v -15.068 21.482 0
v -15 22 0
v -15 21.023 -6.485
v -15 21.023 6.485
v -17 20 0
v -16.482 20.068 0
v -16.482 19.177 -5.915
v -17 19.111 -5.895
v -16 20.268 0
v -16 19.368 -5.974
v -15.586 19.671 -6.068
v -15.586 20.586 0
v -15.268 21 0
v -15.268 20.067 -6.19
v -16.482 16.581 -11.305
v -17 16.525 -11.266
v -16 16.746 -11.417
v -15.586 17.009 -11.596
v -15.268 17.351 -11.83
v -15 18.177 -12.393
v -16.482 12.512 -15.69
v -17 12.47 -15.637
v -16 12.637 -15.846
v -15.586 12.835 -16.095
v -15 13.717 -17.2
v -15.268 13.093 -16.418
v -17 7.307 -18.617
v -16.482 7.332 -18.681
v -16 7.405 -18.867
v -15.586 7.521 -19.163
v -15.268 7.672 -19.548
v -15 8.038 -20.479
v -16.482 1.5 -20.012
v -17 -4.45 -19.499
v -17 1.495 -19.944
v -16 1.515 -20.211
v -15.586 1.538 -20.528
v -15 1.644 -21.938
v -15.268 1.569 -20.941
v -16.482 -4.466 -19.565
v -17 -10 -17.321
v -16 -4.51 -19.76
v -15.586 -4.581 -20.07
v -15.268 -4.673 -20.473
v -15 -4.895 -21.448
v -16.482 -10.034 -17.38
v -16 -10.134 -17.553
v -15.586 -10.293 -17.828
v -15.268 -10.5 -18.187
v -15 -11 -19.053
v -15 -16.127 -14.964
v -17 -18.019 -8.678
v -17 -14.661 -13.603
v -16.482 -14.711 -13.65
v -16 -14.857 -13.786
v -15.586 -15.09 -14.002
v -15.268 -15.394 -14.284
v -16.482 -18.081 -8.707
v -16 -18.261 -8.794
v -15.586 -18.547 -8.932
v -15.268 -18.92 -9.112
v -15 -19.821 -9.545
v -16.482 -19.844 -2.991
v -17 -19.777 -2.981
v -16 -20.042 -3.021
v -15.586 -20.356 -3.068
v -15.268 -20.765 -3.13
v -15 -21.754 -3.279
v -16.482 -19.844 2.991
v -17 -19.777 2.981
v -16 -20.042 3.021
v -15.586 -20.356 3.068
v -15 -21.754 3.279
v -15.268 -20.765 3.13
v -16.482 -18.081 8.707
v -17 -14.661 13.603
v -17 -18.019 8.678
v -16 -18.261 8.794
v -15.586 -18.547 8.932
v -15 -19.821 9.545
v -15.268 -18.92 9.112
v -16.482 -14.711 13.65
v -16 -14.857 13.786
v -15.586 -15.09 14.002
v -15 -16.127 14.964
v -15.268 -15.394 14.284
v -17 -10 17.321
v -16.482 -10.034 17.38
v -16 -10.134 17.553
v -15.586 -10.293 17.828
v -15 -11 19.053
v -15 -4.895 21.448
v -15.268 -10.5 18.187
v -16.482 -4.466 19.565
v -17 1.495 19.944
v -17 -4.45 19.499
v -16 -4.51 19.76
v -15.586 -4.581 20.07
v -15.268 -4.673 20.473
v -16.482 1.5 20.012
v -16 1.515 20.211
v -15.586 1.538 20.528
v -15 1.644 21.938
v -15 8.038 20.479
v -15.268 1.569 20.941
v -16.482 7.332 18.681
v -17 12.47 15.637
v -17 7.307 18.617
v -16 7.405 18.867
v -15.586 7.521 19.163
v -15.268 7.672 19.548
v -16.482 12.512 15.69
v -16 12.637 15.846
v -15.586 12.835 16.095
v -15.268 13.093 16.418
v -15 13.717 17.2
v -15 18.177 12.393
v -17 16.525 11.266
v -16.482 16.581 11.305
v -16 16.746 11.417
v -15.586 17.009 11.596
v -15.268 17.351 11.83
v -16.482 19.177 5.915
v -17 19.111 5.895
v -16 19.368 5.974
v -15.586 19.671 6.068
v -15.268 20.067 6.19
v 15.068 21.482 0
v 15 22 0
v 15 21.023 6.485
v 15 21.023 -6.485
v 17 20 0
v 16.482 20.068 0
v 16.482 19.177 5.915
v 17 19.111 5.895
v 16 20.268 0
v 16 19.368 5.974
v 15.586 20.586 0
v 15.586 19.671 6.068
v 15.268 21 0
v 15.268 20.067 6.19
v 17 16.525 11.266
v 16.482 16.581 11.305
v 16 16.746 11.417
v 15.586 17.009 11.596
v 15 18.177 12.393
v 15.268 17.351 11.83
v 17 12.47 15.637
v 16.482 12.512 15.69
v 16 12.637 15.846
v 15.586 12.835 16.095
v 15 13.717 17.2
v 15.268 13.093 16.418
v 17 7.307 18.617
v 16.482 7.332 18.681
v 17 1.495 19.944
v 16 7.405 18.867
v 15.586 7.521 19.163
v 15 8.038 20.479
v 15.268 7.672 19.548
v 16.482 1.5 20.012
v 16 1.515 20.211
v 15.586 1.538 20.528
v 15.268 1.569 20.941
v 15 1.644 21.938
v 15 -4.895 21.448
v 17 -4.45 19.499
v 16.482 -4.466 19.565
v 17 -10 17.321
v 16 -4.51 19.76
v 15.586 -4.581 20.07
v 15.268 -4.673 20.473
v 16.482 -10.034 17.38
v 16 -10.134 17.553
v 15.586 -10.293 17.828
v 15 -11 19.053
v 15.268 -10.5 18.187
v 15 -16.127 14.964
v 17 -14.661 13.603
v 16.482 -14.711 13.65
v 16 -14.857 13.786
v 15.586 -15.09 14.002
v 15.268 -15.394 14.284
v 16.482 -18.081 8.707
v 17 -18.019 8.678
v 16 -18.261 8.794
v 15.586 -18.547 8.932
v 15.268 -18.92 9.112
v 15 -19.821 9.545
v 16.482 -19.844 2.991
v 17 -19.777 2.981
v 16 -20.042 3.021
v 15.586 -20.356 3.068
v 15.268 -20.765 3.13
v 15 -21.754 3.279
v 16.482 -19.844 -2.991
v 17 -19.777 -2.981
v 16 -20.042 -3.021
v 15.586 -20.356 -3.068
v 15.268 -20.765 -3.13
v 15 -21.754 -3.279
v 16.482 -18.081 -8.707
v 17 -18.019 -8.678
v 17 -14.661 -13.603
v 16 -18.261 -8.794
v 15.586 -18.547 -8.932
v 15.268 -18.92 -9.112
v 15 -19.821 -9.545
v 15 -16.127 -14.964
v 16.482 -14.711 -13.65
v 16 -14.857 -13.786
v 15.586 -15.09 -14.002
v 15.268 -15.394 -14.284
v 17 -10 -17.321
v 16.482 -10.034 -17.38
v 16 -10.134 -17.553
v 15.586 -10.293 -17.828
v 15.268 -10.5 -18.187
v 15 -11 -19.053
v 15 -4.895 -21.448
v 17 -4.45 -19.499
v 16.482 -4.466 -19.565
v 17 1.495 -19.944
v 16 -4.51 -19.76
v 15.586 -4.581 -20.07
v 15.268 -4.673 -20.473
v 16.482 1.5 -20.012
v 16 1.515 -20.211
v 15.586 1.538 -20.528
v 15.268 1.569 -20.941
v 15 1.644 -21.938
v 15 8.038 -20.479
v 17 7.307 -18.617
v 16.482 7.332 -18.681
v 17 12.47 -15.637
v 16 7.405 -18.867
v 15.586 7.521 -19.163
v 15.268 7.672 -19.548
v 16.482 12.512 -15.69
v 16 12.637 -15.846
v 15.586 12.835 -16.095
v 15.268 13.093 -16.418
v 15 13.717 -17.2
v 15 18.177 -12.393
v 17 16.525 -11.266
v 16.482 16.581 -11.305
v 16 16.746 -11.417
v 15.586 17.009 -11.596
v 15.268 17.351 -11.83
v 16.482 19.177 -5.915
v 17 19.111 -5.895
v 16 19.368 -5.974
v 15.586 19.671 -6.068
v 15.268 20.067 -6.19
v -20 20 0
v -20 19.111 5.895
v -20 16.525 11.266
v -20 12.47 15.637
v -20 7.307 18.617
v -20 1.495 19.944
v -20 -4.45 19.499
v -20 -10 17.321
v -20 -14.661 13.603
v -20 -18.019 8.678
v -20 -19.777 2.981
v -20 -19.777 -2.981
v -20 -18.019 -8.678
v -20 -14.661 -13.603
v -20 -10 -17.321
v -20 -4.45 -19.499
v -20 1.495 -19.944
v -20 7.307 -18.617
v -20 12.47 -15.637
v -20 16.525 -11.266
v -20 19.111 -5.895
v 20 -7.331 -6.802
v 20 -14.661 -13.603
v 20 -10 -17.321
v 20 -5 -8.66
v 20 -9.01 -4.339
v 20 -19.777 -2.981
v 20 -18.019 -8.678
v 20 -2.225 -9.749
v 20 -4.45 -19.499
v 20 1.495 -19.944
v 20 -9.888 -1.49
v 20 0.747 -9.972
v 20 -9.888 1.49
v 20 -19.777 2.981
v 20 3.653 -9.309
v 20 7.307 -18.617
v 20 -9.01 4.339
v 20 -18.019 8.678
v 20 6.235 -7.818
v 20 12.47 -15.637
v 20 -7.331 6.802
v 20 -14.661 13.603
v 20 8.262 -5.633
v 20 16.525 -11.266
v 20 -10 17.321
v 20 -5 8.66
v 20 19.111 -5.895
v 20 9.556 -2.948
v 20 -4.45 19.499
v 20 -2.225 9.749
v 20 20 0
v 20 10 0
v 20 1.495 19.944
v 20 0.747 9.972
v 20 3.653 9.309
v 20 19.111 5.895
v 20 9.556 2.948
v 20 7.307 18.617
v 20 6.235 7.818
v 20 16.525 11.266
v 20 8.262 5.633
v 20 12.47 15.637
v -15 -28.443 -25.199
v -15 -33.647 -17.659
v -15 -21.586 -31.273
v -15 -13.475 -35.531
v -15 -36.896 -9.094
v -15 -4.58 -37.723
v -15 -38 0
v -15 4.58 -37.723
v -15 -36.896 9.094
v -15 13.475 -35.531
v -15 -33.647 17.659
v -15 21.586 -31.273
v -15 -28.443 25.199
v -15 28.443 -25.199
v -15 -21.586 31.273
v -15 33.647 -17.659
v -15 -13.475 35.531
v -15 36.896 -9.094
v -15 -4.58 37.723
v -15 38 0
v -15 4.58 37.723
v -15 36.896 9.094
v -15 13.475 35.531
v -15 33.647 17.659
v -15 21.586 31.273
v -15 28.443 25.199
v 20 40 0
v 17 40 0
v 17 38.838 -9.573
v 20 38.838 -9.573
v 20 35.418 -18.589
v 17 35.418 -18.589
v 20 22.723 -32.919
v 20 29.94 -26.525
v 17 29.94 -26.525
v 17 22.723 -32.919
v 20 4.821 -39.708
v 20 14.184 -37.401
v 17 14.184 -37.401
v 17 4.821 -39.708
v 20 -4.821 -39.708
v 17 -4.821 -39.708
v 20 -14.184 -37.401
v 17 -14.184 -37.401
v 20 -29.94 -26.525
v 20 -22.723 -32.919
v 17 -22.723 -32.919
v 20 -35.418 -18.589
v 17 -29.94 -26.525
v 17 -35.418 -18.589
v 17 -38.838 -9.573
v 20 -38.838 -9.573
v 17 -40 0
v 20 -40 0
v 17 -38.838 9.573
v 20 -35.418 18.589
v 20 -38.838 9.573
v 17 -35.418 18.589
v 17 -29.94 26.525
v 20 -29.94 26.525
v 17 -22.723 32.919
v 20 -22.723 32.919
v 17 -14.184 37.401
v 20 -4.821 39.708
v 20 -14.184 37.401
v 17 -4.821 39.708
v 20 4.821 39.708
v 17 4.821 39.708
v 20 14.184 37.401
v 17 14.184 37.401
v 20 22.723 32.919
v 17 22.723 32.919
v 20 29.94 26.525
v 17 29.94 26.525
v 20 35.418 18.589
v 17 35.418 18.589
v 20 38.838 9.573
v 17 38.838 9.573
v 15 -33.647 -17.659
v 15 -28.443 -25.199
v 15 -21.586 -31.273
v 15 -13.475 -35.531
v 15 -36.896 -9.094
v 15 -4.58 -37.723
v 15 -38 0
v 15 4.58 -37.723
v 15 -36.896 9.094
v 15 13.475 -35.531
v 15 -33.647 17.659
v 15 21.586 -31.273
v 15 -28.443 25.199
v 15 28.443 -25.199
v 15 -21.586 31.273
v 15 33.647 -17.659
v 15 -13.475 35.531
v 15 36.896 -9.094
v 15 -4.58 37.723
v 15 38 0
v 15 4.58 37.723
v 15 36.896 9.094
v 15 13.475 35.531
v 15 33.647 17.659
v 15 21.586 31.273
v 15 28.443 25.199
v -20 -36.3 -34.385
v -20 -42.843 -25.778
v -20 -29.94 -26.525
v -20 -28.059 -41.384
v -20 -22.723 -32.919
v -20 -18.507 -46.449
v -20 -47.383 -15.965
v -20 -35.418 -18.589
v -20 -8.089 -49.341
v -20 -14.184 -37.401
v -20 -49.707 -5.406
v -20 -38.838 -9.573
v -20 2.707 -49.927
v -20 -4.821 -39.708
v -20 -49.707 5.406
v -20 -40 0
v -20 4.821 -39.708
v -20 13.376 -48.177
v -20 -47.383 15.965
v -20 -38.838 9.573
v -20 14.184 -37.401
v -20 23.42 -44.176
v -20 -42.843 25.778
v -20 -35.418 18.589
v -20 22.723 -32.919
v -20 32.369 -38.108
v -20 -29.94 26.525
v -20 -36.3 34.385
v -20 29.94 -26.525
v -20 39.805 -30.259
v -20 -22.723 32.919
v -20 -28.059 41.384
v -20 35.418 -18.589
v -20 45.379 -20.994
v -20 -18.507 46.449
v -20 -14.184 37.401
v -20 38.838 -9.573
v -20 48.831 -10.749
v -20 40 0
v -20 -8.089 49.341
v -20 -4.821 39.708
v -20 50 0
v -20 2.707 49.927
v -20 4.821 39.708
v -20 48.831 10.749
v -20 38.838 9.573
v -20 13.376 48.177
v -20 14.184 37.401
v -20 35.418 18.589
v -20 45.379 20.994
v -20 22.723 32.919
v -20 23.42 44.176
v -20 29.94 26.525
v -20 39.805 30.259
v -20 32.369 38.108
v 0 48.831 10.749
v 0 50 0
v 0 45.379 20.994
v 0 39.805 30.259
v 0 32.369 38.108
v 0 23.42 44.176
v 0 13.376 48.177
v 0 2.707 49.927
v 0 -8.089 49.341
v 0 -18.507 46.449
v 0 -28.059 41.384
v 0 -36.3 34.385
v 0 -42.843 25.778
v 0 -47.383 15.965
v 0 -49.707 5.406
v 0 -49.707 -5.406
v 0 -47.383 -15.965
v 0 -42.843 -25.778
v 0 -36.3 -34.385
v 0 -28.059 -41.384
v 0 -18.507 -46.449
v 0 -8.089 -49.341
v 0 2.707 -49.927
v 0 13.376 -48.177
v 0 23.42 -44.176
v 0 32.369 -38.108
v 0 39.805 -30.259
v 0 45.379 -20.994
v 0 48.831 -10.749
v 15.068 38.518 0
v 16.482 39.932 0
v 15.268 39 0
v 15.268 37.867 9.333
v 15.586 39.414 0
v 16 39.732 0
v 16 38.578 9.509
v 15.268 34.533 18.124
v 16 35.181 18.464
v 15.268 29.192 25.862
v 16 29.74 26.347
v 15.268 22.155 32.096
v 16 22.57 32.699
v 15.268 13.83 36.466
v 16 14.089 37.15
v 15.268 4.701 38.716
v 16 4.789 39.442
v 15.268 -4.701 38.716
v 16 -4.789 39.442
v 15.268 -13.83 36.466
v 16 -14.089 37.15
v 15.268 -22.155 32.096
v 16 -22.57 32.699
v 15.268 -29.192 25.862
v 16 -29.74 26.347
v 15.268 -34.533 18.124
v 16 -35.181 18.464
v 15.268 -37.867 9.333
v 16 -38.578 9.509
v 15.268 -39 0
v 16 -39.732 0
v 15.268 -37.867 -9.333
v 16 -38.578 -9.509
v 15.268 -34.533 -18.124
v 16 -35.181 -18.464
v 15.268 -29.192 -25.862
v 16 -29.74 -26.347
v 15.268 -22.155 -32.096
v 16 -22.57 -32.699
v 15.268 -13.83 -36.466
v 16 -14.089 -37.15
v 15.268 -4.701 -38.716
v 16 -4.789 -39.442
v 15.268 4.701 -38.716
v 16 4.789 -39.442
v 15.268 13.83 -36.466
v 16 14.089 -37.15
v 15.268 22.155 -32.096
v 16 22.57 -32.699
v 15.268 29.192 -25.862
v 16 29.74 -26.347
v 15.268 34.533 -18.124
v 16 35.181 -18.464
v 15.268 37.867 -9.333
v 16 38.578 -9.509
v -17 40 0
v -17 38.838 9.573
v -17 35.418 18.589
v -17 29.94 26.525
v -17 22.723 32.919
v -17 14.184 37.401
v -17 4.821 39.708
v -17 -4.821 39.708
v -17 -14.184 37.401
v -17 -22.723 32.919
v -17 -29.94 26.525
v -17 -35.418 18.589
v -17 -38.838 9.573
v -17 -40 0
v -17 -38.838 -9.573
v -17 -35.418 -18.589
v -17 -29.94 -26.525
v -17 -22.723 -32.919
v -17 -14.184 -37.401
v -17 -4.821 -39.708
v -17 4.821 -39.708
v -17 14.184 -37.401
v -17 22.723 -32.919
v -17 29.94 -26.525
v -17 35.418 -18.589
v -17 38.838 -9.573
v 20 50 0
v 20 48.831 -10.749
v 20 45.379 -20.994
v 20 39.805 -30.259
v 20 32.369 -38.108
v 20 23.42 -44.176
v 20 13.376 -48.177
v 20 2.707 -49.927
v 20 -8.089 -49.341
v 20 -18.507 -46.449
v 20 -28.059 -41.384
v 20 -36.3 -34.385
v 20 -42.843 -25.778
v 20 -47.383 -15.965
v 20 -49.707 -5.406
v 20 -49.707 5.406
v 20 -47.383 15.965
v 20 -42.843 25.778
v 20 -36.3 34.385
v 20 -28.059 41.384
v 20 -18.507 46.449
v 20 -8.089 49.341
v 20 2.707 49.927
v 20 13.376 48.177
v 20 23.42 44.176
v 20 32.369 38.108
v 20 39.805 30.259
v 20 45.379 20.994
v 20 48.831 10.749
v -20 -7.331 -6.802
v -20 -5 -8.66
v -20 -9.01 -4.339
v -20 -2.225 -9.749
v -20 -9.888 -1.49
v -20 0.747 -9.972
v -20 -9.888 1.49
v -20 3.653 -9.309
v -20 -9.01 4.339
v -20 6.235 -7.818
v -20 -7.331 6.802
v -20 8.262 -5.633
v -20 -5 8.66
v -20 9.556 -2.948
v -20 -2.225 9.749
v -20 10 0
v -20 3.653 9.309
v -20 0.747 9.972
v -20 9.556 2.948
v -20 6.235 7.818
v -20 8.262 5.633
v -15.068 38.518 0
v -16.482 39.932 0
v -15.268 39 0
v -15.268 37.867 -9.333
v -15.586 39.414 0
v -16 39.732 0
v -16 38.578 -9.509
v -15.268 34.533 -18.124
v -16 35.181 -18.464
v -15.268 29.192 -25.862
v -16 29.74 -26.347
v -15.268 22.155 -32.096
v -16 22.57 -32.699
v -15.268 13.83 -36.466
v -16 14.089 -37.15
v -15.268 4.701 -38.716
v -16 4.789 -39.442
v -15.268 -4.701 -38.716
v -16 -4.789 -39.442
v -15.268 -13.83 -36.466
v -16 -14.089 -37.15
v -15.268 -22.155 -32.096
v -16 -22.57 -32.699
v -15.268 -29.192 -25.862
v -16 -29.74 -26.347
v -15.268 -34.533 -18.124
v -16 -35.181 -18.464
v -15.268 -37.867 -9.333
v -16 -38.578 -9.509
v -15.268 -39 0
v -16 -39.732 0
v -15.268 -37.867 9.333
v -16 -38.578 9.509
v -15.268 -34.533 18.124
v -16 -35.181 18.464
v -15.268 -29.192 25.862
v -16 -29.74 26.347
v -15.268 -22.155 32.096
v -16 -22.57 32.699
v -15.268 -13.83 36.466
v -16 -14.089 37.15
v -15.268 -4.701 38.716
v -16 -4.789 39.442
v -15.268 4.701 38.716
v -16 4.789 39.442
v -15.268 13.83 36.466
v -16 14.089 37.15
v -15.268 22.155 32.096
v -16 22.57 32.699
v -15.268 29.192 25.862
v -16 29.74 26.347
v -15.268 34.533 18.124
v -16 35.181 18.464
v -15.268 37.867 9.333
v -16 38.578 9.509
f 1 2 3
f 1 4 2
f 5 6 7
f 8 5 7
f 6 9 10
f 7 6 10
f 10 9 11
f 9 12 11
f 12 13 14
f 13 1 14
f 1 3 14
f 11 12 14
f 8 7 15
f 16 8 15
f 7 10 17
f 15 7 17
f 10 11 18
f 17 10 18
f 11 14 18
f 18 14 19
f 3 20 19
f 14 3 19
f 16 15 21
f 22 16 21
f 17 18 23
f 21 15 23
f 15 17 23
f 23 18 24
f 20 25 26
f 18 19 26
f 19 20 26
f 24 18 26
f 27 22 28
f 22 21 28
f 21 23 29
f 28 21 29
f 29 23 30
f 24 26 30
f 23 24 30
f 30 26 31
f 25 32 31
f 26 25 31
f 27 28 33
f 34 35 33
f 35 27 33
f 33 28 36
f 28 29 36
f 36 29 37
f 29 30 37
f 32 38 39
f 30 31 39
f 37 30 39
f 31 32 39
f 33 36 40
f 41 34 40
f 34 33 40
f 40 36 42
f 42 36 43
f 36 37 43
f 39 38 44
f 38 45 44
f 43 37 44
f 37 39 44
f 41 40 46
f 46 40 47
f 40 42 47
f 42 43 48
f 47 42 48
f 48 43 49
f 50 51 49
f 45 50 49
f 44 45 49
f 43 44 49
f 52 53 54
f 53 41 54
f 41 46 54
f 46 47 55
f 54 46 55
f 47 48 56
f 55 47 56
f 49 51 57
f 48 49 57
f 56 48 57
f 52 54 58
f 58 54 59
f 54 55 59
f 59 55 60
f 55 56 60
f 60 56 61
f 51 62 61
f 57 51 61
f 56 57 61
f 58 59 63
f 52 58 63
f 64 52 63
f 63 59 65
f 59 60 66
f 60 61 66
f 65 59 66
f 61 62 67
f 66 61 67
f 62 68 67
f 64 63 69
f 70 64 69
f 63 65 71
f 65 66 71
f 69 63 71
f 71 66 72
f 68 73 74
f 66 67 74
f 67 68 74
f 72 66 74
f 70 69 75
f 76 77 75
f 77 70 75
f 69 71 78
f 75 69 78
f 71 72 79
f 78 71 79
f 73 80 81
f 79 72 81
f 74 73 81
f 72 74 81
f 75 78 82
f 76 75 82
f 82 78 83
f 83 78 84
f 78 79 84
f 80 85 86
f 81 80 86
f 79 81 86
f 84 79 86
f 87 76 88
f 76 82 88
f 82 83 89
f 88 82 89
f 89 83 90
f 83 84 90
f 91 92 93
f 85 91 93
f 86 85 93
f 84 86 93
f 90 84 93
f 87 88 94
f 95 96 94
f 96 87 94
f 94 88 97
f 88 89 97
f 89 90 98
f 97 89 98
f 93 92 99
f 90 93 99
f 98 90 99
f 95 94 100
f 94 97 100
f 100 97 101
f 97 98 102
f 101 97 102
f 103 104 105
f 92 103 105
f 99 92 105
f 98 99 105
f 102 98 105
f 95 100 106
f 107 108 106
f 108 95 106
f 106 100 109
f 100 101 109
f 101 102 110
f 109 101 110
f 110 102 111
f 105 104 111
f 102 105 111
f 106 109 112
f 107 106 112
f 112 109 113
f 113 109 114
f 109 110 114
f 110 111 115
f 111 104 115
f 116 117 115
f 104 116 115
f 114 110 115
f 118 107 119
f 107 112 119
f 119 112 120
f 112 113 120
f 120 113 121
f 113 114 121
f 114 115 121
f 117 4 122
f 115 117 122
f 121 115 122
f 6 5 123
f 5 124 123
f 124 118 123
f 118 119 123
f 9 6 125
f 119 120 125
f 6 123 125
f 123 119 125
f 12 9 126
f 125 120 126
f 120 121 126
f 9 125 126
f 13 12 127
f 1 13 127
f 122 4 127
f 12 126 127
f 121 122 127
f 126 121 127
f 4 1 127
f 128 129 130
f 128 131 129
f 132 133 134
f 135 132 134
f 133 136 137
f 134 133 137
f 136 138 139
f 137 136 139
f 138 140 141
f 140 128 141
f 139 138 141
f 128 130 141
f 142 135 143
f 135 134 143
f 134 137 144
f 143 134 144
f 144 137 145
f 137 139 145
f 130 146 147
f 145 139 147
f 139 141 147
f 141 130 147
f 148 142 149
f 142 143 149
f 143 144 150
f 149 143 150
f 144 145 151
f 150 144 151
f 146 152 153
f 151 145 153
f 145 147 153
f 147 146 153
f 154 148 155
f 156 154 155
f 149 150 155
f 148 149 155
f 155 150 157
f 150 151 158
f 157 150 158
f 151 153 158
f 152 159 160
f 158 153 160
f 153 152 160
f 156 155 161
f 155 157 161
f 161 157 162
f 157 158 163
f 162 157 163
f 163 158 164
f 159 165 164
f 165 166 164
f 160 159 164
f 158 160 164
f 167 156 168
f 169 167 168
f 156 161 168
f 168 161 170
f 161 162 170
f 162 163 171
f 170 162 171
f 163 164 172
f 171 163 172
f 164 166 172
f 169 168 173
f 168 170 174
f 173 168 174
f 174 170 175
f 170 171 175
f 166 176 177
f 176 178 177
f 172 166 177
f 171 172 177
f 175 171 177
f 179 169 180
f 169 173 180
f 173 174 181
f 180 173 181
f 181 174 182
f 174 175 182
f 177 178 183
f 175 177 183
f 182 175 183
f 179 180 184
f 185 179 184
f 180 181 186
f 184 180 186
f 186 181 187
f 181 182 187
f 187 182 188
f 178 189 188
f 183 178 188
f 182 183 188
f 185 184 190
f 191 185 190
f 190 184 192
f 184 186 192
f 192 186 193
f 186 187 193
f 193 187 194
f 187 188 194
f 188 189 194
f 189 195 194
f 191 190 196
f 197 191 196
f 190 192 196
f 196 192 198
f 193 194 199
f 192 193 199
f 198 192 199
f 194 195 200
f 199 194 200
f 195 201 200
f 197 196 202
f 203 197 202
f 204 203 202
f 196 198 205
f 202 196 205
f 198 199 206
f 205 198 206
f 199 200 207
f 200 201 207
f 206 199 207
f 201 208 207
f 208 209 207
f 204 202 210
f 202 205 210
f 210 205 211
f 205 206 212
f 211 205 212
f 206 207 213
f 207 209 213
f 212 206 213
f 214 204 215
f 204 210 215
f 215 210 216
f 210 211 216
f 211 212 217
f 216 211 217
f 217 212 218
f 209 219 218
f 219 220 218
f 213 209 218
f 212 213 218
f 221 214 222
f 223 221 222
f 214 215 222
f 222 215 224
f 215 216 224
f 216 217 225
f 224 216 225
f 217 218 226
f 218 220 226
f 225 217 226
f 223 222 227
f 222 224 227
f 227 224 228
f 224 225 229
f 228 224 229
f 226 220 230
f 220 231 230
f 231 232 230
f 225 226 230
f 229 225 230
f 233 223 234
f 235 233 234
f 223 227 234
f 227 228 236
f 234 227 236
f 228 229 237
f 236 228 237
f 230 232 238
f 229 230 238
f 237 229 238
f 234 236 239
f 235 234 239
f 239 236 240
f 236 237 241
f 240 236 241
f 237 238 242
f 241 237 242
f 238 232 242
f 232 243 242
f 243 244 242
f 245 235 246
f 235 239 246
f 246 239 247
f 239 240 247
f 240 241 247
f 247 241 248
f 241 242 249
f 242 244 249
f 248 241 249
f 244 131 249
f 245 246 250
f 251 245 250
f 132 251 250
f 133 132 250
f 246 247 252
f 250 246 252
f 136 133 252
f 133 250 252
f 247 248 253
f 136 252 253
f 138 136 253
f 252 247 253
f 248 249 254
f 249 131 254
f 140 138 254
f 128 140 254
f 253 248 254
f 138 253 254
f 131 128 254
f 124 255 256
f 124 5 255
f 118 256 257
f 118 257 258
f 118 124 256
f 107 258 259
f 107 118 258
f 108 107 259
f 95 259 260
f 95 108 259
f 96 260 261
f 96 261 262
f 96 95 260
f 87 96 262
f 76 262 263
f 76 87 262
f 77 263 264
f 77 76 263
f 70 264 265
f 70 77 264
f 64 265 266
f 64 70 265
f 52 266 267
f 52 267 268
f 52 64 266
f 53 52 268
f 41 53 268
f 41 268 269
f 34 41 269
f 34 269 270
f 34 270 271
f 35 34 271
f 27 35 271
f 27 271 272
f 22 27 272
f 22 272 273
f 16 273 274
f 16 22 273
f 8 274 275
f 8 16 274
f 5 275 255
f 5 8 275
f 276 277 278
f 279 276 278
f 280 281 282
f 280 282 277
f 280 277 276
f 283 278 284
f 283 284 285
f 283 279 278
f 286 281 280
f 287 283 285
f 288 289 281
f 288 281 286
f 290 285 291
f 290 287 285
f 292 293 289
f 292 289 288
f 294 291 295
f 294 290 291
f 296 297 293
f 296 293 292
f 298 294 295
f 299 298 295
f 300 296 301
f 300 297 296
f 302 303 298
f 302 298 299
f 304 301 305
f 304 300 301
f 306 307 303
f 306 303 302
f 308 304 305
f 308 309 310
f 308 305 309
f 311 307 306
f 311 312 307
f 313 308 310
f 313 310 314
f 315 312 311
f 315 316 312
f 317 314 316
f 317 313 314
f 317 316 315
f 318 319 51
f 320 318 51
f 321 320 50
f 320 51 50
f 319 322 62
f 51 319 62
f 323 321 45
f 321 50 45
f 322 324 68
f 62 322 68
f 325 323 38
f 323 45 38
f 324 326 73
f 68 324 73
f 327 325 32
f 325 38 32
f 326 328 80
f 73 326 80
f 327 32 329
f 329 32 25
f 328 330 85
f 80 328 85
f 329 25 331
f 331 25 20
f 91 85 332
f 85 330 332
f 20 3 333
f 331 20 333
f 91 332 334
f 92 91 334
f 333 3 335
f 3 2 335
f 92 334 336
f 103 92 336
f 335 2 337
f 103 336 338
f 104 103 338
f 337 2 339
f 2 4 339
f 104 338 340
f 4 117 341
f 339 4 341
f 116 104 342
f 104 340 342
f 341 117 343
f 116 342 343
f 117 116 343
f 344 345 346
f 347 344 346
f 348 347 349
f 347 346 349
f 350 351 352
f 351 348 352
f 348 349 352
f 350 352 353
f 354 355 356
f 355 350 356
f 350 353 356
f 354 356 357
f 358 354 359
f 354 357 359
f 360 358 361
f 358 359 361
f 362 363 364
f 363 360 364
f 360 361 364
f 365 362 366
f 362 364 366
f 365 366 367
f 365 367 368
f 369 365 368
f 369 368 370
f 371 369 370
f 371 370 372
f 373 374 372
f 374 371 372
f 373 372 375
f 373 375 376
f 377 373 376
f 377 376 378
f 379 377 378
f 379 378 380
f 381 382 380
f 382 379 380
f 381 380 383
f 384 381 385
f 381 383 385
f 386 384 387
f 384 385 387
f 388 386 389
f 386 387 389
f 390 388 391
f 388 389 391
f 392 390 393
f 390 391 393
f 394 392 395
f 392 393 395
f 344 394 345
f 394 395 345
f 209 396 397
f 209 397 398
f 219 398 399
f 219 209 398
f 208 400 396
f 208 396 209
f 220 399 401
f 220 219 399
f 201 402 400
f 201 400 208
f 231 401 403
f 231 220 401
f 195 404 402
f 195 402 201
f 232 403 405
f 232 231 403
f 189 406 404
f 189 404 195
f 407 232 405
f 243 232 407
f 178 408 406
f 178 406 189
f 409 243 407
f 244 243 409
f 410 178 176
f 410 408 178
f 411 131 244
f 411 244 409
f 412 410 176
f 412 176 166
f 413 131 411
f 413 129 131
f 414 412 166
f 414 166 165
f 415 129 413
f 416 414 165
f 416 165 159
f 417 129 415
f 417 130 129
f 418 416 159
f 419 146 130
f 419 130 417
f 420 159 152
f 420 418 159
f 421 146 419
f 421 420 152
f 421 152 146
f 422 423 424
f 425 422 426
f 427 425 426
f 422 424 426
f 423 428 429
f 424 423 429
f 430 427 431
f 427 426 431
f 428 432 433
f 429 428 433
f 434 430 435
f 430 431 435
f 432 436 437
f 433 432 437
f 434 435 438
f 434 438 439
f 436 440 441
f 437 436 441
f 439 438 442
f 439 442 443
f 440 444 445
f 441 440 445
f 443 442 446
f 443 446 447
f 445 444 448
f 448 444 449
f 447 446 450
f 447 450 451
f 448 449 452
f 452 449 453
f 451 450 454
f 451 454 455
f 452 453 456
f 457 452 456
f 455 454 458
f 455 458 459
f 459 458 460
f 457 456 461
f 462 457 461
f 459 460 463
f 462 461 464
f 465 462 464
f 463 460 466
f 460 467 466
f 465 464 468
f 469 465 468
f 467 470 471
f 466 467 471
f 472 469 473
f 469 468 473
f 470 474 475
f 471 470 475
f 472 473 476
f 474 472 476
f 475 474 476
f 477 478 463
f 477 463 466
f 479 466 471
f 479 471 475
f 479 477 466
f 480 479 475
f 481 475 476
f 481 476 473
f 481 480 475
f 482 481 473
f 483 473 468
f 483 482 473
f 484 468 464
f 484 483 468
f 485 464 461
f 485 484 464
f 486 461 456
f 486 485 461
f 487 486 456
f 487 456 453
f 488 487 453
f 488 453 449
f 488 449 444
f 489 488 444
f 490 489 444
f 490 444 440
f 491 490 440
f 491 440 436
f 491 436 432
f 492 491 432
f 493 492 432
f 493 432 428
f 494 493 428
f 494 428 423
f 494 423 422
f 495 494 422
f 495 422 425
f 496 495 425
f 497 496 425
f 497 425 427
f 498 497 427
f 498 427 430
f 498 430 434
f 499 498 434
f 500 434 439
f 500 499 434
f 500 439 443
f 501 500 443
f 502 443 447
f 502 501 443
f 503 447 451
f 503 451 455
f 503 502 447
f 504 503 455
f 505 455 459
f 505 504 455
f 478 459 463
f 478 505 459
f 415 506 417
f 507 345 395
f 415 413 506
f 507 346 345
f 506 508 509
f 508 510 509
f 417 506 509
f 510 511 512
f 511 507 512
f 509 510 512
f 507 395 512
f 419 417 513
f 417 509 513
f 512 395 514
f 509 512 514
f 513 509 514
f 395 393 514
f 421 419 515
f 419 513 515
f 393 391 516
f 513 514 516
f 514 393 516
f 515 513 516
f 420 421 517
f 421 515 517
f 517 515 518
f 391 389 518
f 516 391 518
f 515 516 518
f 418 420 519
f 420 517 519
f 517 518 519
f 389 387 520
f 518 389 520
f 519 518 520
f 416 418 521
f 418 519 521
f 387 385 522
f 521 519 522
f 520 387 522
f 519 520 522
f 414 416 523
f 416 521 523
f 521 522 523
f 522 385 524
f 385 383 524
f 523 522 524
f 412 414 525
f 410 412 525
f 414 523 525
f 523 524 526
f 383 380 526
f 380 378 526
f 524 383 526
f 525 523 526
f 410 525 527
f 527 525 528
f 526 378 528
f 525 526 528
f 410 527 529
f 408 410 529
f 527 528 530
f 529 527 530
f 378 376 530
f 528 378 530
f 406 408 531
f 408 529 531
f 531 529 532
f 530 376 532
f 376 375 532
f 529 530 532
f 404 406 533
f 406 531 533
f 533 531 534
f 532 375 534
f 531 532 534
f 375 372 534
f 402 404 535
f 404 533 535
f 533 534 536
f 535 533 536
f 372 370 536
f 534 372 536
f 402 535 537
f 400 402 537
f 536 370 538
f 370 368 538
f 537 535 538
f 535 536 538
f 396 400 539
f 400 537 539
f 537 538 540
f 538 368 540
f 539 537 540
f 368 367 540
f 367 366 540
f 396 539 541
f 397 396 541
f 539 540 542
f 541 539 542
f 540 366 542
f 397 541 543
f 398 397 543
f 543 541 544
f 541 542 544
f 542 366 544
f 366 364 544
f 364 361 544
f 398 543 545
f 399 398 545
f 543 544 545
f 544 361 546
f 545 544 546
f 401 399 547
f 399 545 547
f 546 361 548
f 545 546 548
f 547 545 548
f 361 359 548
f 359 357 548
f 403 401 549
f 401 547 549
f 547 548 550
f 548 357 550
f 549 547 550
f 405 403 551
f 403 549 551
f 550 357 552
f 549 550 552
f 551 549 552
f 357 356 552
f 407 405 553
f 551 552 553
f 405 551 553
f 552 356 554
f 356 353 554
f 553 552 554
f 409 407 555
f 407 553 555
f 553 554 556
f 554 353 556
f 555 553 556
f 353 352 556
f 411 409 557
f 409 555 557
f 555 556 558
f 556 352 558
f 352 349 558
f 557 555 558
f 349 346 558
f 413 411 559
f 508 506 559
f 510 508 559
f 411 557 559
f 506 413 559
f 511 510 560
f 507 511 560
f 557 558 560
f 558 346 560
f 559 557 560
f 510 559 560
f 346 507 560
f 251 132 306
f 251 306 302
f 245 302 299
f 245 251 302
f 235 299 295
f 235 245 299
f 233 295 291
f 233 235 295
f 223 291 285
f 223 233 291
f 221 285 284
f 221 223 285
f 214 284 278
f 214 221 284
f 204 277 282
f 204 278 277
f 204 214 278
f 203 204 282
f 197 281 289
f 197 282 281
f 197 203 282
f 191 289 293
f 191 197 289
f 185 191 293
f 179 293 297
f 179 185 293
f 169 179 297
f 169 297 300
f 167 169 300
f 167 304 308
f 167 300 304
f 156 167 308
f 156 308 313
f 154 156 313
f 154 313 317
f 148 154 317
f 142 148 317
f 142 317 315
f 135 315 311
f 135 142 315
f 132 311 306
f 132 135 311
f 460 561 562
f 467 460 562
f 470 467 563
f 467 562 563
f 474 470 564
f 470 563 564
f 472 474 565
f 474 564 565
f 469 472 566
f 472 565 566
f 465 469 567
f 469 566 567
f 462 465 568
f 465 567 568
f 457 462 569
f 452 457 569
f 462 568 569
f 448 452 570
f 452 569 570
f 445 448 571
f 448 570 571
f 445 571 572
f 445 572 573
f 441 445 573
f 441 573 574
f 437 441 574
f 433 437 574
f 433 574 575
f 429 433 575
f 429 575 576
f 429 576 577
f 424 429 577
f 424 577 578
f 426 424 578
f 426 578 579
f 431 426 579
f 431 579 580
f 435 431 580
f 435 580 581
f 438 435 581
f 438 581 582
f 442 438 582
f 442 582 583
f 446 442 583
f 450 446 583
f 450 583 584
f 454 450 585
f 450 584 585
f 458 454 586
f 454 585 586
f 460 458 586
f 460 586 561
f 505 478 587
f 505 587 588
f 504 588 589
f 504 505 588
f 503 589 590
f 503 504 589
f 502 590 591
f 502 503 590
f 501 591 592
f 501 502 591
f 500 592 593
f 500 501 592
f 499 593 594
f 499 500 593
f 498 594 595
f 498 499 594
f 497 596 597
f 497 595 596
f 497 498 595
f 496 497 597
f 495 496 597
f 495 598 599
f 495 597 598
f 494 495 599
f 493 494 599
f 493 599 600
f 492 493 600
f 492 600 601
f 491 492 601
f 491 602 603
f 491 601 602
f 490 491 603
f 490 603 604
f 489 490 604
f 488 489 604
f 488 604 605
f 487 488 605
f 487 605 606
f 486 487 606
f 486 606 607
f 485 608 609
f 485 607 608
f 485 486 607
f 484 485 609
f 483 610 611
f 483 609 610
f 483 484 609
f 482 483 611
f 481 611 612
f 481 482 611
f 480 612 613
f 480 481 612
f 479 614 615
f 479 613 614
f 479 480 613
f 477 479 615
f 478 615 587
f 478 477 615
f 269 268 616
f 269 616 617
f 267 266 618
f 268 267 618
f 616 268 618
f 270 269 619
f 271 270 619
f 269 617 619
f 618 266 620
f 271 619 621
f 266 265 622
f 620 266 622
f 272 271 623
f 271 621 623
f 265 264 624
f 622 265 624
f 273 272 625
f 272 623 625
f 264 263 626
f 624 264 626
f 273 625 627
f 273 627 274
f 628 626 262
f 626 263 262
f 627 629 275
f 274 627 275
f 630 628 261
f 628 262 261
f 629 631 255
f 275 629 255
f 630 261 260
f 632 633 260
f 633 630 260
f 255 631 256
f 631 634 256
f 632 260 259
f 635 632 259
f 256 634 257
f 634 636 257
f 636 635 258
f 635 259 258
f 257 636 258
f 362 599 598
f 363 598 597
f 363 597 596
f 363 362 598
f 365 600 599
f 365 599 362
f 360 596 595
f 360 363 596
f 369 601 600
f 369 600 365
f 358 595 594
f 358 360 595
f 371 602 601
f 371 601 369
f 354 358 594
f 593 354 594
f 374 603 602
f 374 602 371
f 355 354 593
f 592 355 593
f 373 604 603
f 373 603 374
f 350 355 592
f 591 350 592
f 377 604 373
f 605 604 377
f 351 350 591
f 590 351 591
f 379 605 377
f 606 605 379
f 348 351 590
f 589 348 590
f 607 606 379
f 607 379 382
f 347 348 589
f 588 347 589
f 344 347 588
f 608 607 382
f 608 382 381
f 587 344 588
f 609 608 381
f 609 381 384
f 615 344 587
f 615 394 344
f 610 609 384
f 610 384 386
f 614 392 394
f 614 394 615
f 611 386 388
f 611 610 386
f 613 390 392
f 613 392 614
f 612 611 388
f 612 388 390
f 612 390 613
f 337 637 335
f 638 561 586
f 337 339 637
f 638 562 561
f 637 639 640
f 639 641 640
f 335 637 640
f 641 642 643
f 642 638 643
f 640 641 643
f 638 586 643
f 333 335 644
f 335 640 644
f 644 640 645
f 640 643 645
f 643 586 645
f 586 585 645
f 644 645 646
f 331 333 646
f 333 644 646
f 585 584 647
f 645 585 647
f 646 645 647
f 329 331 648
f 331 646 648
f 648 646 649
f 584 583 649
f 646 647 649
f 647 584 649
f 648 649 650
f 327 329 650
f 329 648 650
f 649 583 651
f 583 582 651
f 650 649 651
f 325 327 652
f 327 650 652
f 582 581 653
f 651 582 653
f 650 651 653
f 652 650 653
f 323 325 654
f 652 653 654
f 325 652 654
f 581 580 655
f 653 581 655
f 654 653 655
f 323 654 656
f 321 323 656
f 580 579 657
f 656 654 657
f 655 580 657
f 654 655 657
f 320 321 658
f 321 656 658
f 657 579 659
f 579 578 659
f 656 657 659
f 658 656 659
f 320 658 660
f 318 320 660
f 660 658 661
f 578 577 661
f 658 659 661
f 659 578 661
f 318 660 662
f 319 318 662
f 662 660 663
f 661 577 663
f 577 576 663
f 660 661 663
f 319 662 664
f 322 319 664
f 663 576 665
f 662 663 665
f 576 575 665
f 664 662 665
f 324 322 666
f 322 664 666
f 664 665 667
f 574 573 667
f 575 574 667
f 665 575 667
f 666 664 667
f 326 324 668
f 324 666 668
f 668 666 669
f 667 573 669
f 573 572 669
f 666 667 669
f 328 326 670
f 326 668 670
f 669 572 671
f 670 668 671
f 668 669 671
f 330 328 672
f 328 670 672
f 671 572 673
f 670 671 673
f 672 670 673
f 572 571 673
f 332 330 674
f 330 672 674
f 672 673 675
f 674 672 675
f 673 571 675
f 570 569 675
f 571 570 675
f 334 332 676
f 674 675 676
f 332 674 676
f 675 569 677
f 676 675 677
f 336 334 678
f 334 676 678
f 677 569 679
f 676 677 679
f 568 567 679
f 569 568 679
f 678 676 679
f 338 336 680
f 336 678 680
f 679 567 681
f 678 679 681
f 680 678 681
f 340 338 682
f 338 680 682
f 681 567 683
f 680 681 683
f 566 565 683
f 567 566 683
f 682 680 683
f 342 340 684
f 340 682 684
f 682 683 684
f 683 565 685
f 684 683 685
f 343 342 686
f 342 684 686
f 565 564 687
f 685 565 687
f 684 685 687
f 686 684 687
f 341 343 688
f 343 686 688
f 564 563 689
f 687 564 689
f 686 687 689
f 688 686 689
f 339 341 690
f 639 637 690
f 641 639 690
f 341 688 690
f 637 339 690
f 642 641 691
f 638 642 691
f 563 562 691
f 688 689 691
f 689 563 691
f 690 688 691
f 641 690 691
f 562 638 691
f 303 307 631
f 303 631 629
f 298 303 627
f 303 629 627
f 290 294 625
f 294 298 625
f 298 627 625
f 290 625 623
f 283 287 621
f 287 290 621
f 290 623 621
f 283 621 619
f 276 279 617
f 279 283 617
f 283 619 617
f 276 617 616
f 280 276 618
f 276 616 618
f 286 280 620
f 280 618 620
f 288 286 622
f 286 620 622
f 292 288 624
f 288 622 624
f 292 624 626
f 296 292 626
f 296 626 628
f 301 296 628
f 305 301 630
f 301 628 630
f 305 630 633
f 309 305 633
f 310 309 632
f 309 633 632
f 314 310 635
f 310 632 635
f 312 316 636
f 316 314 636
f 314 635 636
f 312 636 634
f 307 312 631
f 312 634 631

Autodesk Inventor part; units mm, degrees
ref_plane "YZ Plane" through (0, 0, 0) normal (1, 0, 0) x (0, 1, 0)
ref_plane "XZ Plane" through (0, 0, 0) normal (0, 1, 0) x (-1, 0, 0)
ref_plane "XY Plane" through (0, 0, 0) normal (0, 0, 1) x (1, 0, 0)
sketch "Sketch1" plane through (0, 0, 0) normal (1, 0, 0) x (0, 1, 0)
  circle A0 centre (0, 0) radius 10
  circle A1 centre (0, 0) radius 20
  circle A2 centre (0, 0) radius 40
  circle A3 centre (0, 0) radius 50
  dimension "d0" = 20
  dimension "d1" = 40
  dimension "d2" = 80
  dimension "d3" = 100
extrude "Extrusion1" add sketch "Sketch1" along normal mid plane 40
extrude "Extrusion2" add sketch "Sketch1" along normal mid plane 30 contours A2
fillet "Fillet1" radius 2 1 edges at (-15, -40, 0)
fillet "Fillet4" radius 2 1 edges at (15, -40, 0)
fillet "Fillet5" radius 2 1 edges at (-15, -20, 0)
fillet "Fillet6" radius 2 1 edges at (15, -20, 0)
